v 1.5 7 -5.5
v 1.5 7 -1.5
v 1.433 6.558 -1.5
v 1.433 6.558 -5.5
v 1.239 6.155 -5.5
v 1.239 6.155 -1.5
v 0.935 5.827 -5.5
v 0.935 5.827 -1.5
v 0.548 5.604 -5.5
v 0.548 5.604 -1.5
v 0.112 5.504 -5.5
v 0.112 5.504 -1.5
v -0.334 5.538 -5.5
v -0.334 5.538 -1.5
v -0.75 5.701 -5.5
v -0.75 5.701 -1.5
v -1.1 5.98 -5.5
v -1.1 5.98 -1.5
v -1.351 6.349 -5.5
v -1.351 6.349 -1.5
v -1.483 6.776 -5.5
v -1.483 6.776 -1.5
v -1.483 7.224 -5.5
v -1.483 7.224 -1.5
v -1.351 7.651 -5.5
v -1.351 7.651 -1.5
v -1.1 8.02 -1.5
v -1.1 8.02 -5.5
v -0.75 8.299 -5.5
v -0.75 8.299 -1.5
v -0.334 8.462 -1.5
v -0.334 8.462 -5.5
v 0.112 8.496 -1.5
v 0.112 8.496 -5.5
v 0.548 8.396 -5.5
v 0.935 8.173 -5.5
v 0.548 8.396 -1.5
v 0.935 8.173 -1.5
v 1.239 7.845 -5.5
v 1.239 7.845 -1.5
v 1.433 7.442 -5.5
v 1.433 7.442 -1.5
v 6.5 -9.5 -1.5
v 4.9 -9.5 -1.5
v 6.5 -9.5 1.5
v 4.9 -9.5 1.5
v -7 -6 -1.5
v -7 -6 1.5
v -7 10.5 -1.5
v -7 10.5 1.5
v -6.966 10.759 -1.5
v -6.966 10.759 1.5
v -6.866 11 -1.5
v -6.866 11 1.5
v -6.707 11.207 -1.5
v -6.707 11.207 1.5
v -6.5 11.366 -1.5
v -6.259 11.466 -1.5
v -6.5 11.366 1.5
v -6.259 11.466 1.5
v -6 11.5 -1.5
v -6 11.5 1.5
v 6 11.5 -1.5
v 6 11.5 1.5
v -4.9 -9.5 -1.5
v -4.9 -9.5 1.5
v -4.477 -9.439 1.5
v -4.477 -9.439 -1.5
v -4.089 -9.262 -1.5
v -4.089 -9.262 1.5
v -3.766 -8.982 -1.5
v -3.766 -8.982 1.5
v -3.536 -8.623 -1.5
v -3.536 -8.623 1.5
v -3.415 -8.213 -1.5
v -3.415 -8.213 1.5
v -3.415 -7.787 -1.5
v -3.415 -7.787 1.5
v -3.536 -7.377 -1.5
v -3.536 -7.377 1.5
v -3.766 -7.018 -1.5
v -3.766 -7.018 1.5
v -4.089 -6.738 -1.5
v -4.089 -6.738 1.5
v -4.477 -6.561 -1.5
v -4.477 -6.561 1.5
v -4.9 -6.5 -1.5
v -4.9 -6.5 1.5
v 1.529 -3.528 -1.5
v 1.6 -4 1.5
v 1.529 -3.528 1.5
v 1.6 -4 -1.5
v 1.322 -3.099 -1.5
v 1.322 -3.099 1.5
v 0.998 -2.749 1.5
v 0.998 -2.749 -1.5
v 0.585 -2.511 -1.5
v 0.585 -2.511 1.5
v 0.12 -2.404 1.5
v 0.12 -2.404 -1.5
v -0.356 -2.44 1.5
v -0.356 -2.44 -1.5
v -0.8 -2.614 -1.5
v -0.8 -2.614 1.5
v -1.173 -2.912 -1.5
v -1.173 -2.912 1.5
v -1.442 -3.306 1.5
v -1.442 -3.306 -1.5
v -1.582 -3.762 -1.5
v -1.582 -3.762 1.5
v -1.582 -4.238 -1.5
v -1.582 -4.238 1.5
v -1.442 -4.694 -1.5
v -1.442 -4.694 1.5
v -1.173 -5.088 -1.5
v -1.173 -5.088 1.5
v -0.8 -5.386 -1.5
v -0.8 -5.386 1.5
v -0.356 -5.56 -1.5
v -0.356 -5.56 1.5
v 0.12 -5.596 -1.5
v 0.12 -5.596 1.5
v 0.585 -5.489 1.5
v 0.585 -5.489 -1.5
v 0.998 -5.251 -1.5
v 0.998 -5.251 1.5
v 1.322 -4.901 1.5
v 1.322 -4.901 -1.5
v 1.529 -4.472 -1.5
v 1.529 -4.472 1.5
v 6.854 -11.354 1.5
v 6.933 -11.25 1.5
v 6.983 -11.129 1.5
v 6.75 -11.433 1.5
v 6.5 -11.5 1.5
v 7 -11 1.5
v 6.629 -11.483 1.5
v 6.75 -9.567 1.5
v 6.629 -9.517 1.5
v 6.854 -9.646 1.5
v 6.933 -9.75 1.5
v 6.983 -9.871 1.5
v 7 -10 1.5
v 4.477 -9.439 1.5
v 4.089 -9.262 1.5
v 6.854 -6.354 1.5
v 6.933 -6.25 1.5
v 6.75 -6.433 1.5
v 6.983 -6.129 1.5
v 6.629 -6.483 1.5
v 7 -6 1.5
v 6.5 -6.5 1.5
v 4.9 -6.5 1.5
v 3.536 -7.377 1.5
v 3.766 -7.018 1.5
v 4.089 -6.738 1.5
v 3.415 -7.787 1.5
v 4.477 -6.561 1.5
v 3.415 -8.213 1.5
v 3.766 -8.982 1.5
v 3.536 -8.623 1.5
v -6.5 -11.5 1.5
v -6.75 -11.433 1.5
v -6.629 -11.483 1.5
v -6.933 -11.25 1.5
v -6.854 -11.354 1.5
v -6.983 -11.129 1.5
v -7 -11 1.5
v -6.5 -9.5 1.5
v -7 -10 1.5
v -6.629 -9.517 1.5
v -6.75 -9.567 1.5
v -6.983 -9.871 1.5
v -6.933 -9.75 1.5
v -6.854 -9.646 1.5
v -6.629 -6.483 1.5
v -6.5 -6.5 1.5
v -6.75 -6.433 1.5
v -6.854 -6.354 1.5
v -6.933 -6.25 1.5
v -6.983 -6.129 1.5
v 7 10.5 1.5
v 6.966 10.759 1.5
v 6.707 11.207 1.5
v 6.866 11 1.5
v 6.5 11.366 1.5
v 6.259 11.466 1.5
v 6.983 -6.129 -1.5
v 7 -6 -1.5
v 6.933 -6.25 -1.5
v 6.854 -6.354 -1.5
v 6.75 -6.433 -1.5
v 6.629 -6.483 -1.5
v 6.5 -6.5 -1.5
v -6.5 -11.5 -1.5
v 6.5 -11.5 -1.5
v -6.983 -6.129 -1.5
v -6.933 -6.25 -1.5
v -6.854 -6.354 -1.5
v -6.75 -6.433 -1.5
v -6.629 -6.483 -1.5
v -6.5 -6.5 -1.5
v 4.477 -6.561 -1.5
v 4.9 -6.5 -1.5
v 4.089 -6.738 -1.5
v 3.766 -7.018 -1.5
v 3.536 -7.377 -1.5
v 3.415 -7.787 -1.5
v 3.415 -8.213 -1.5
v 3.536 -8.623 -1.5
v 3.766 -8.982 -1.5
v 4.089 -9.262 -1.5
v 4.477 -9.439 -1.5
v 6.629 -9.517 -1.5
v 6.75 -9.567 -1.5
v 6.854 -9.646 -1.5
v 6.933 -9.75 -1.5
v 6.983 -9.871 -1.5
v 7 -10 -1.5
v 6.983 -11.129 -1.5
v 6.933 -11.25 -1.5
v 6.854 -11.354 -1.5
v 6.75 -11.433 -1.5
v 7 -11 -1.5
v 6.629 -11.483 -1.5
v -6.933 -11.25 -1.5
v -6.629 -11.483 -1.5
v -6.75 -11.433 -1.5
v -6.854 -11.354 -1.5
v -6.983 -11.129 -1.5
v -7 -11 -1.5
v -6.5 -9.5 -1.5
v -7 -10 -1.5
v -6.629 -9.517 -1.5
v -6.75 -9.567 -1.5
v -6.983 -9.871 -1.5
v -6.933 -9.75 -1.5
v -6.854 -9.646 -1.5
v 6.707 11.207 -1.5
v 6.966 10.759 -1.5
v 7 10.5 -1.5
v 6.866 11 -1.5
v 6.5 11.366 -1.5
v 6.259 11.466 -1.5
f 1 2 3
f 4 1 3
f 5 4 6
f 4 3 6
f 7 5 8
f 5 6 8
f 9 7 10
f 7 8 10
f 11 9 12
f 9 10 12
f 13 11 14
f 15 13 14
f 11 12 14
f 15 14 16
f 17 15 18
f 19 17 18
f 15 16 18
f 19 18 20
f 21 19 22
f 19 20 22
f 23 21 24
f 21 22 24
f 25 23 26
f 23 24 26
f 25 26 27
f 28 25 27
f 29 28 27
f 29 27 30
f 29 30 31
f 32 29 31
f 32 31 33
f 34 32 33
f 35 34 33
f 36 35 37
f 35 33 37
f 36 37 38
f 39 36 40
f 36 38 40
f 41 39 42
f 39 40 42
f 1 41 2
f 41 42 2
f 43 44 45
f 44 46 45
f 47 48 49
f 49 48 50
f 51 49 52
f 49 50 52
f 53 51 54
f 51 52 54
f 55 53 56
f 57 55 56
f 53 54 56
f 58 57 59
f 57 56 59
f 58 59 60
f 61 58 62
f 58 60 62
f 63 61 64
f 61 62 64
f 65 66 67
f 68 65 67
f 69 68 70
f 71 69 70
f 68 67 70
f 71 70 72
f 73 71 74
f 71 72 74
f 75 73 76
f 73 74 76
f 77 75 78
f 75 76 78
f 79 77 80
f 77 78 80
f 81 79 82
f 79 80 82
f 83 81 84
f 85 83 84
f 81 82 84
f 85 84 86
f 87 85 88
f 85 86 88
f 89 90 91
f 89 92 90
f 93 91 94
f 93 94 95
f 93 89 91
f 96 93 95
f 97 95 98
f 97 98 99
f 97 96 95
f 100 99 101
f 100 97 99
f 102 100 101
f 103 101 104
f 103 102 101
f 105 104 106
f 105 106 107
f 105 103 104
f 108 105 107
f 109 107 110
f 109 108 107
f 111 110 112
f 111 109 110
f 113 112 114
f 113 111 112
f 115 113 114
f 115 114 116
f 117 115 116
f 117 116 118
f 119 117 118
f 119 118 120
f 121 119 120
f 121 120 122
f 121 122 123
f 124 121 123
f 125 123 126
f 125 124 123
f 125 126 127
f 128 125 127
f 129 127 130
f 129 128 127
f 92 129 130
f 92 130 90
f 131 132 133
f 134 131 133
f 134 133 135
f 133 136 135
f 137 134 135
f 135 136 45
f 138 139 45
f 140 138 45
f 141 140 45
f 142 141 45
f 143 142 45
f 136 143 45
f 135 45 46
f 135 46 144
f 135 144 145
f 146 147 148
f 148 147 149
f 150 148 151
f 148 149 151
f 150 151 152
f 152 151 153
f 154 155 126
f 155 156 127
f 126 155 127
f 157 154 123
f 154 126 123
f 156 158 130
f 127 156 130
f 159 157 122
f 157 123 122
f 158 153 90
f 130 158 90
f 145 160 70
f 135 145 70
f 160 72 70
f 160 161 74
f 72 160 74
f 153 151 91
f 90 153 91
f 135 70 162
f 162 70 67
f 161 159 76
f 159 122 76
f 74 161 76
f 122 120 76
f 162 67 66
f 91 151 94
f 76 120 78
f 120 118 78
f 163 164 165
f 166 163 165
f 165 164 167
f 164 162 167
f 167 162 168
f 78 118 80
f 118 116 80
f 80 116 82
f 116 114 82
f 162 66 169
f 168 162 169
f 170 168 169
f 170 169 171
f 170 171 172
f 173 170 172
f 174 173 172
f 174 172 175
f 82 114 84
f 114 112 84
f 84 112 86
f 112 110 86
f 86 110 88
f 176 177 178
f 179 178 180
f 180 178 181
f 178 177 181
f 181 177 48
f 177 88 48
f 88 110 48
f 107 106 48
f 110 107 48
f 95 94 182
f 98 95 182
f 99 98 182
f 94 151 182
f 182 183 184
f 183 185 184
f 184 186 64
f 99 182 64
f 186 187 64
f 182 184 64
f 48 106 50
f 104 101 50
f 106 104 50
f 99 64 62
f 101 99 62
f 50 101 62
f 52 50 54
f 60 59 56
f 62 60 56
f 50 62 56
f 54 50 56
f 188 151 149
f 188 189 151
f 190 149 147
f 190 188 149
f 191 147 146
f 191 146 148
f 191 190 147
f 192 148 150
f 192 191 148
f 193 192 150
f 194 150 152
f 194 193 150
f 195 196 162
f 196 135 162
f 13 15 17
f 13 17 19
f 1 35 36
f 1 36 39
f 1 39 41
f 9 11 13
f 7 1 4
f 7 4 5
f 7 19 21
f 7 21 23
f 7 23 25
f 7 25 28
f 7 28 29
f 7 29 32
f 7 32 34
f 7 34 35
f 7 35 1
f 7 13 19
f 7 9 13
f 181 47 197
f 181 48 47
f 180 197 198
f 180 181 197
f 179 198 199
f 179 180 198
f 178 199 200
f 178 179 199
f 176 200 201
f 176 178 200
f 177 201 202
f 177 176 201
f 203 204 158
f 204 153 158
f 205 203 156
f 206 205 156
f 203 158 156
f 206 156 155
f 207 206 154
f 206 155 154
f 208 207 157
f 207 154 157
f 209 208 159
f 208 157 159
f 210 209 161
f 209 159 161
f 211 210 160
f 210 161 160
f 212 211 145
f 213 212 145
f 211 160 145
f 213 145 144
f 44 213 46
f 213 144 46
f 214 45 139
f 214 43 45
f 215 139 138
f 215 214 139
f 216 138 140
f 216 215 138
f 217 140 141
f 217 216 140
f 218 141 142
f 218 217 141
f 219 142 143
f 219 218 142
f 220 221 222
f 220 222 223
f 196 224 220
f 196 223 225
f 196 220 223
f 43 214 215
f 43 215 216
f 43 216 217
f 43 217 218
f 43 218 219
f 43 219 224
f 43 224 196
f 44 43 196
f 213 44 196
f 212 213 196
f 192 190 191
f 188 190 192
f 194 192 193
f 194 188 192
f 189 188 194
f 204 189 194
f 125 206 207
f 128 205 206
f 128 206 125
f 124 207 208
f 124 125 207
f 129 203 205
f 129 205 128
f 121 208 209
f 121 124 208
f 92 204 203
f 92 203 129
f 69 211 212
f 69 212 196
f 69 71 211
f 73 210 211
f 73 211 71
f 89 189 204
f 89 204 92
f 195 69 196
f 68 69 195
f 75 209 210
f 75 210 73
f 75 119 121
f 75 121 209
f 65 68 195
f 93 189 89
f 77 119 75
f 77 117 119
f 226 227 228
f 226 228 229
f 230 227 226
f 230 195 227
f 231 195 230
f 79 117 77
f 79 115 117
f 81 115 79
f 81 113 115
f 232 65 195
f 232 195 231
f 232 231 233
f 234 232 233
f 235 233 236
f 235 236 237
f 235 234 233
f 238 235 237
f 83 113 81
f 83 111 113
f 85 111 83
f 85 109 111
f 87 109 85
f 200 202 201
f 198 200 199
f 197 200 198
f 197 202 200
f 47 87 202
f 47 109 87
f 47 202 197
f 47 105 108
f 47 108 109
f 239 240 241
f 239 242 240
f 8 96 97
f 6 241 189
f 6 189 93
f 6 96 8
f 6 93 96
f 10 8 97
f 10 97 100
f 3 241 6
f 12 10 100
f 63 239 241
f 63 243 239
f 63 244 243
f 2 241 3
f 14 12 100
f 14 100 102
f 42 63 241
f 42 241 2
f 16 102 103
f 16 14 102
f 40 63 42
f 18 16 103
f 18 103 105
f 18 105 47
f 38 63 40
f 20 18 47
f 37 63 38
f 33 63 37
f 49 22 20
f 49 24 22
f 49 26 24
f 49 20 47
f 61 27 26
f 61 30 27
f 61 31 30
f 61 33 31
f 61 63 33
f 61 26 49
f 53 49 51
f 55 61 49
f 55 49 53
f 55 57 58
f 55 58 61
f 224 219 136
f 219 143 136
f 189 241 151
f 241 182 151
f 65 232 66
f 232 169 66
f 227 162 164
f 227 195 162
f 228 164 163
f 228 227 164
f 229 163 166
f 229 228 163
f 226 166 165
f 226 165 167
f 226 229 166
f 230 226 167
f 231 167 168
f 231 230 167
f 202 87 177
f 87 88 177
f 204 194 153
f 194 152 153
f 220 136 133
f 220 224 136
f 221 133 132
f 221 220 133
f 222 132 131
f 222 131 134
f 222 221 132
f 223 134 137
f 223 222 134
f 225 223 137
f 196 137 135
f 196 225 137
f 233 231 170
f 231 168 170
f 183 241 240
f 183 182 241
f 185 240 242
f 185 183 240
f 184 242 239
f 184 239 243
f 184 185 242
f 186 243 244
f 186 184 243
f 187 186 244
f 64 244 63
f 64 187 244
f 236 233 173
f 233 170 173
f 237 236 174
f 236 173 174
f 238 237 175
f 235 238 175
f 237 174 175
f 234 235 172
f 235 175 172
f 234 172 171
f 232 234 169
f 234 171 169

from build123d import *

# Parameters (mm, degrees)
CROQUIS1_R              = 1.6
SALIENTE_EXTRUIR1_DEPTH = 1.5
REDONDEO1_R             = 1
REDONDEO2_R             = 0.5
CROQUIS2_R              = 1.5
SALIENTE_EXTRUIR2_DEPTH = 4


with BuildPart() as part:
    # Croquis1 → Saliente-Extruir1 (new, symmetric)
    with BuildSketch(Plane.XY):
        with BuildLine():
            Line((3, 11.5), (7, 11.5))
            Line((7, 11.5), (7, -6.5))
            Line((7, -6.5), (4.9, -6.5))
            ThreePointArc((4.9, -6.5), (3.4, -8), (4.9, -9.5))
            Line((4.9, -9.5), (7, -9.5))
            Line((7, -9.5), (7, -11.5))
            Line((7, -11.5), (-7, -11.5))
            Line((-7, -11.5), (-7, -9.5))
            Line((-7, -9.5), (-4.9, -9.5))
            ThreePointArc((-4.9, -9.5), (-3.4, -8), (-4.9, -6.5))
            Line((-4.9, -6.5), (-7, -6.5))
            Line((-7, -6.5), (-7, 11.5))
            Line((-7, 11.5), (-3, 11.5))
            Line((-3, 11.5), (3, 11.5))
        make_face()
        with Locations((0, -4)):
            Circle(CROQUIS1_R, mode=Mode.SUBTRACT)
    extrude(amount=SALIENTE_EXTRUIR1_DEPTH, both=True)

    # Redondeo1
    redondeo1_edges = [part.edges().sort_by_distance(p)[0] for p in [
        (-7, 11.5, 0),
        (7, 11.5, 0),
    ]]
    fillet(redondeo1_edges, radius=REDONDEO1_R)

    # Redondeo2
    redondeo2_edges = [part.edges().sort_by_distance(p)[0] for p in [
        (7, -11.5, 0),
        (-7, -11.5, 0),
        (-7, -9.5, 0),
        (-7, -6.5, 0),
        (7, -6.5, 0),
        (7, -9.5, 0),
    ]]
    fillet(redondeo2_edges, radius=REDONDEO2_R)

    # Croquis2 → Saliente-Extruir2 (add)
    with BuildSketch(Plane(origin=(0, 0, -1.5), x_dir=(-1, 0, 0), z_dir=(0, 0, -1))):
        with Locations(Location((0, 7, 0), (0, 0, 180))):
            Circle(CROQUIS2_R)
    extrude(amount=SALIENTE_EXTRUIR2_DEPTH)


solid = part.part
